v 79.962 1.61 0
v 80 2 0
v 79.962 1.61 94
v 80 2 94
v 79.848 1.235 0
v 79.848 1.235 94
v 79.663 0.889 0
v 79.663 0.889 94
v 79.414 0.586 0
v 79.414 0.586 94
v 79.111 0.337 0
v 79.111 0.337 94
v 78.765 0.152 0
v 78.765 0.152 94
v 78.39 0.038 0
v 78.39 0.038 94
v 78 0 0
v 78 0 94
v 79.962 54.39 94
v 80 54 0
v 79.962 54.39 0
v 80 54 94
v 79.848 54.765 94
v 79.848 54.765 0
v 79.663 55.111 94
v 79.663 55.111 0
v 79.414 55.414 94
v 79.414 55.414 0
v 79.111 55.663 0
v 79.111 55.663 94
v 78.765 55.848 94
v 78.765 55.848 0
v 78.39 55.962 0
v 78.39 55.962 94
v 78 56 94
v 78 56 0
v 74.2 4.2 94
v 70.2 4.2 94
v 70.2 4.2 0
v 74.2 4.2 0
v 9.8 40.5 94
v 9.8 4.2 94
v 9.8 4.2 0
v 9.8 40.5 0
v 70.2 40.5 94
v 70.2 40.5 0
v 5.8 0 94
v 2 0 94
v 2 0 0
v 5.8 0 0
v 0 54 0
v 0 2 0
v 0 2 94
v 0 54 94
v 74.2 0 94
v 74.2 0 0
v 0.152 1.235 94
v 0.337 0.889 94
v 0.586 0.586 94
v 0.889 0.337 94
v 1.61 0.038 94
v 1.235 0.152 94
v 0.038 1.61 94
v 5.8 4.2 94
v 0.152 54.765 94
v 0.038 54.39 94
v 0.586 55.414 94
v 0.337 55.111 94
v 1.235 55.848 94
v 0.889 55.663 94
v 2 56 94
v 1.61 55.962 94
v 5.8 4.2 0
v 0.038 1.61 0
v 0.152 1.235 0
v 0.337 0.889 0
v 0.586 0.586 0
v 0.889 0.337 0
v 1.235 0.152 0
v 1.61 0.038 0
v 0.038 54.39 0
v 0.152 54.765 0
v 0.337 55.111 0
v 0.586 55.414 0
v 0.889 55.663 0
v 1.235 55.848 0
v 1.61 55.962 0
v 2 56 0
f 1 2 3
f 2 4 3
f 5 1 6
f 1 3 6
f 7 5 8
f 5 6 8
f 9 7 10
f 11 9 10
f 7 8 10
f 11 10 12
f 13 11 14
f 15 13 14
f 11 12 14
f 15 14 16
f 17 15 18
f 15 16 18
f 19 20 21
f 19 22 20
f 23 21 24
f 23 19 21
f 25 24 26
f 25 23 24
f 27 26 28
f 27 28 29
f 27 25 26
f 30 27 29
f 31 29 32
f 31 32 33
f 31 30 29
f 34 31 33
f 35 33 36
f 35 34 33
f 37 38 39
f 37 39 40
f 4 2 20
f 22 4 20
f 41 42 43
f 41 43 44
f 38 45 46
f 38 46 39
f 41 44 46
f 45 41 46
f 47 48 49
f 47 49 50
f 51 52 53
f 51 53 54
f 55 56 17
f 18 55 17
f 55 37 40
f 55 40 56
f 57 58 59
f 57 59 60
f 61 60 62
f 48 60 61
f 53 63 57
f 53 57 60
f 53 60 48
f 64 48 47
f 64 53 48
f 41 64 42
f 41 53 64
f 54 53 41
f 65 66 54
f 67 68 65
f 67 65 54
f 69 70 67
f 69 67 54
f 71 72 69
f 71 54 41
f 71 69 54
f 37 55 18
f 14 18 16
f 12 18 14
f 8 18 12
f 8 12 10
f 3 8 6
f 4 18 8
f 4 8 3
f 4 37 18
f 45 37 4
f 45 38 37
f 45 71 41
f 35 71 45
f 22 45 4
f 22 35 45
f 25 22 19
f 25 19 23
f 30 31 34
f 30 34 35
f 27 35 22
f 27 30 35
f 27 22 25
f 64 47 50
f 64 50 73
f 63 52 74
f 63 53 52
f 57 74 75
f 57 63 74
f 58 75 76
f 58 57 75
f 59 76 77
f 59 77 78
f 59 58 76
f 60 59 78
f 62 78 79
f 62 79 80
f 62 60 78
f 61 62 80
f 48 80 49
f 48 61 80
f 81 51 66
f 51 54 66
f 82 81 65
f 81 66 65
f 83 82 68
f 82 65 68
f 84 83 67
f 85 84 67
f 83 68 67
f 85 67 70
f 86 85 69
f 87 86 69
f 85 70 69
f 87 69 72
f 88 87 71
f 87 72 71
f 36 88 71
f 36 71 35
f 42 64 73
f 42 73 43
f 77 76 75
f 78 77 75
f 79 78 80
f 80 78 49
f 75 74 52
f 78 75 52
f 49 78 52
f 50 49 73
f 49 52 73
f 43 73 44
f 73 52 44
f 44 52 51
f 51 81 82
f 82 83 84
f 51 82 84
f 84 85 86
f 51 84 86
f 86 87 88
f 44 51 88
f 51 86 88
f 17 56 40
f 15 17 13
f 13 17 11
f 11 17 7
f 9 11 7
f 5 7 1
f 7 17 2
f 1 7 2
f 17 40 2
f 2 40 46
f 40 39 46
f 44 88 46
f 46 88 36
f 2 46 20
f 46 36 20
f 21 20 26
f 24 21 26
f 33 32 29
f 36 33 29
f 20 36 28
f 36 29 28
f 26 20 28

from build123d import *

# Parameters (mm, degrees)
SKETCH1_W           = 80
SKETCH1_H           = 56
SKETCH1_W_2         = 60.4
SKETCH1_H_2         = 30.2
BOSS_EXTRUDE1_DEPTH = 94
CUT_EXTRUDE1_DEPTH  = 136.543350999
FILLET1_R           = 2


with BuildPart() as part:
    # Sketch1 → Boss-Extrude1 (new body)
    with BuildSketch(Plane.XY):
        with Locations((40, 28)):
            Rectangle(SKETCH1_W, SKETCH1_H)
        with Locations((40, 25.4)):
            Rectangle(SKETCH1_W_2, SKETCH1_H_2, mode=Mode.SUBTRACT)
    extrude(amount=BOSS_EXTRUDE1_DEPTH)

    # Sketch2 → Cut-Extrude1 (cut, through all)
    with BuildSketch(Plane.XY.offset(94)):
        Polygon((9.8, 10.3), (70.2, 10.3), (70.2, 4.2), (74.2, 4.2), (74.2, 0), (70, 0), (10, 0), (5.8, 0), (5.8, 4.2), (9.8, 4.2), align=None)
    extrude(amount=-CUT_EXTRUDE1_DEPTH, mode=Mode.SUBTRACT)

    # Fillet1
    fillet1_edges = [part.edges().sort_by_distance(p)[0] for p in [
        (0, 56, 47),
        (80, 56, 47),
        (80, 0, 47),
        (0, 0, 47),
    ]]
    fillet(fillet1_edges, radius=FILLET1_R)


solid = part.part
